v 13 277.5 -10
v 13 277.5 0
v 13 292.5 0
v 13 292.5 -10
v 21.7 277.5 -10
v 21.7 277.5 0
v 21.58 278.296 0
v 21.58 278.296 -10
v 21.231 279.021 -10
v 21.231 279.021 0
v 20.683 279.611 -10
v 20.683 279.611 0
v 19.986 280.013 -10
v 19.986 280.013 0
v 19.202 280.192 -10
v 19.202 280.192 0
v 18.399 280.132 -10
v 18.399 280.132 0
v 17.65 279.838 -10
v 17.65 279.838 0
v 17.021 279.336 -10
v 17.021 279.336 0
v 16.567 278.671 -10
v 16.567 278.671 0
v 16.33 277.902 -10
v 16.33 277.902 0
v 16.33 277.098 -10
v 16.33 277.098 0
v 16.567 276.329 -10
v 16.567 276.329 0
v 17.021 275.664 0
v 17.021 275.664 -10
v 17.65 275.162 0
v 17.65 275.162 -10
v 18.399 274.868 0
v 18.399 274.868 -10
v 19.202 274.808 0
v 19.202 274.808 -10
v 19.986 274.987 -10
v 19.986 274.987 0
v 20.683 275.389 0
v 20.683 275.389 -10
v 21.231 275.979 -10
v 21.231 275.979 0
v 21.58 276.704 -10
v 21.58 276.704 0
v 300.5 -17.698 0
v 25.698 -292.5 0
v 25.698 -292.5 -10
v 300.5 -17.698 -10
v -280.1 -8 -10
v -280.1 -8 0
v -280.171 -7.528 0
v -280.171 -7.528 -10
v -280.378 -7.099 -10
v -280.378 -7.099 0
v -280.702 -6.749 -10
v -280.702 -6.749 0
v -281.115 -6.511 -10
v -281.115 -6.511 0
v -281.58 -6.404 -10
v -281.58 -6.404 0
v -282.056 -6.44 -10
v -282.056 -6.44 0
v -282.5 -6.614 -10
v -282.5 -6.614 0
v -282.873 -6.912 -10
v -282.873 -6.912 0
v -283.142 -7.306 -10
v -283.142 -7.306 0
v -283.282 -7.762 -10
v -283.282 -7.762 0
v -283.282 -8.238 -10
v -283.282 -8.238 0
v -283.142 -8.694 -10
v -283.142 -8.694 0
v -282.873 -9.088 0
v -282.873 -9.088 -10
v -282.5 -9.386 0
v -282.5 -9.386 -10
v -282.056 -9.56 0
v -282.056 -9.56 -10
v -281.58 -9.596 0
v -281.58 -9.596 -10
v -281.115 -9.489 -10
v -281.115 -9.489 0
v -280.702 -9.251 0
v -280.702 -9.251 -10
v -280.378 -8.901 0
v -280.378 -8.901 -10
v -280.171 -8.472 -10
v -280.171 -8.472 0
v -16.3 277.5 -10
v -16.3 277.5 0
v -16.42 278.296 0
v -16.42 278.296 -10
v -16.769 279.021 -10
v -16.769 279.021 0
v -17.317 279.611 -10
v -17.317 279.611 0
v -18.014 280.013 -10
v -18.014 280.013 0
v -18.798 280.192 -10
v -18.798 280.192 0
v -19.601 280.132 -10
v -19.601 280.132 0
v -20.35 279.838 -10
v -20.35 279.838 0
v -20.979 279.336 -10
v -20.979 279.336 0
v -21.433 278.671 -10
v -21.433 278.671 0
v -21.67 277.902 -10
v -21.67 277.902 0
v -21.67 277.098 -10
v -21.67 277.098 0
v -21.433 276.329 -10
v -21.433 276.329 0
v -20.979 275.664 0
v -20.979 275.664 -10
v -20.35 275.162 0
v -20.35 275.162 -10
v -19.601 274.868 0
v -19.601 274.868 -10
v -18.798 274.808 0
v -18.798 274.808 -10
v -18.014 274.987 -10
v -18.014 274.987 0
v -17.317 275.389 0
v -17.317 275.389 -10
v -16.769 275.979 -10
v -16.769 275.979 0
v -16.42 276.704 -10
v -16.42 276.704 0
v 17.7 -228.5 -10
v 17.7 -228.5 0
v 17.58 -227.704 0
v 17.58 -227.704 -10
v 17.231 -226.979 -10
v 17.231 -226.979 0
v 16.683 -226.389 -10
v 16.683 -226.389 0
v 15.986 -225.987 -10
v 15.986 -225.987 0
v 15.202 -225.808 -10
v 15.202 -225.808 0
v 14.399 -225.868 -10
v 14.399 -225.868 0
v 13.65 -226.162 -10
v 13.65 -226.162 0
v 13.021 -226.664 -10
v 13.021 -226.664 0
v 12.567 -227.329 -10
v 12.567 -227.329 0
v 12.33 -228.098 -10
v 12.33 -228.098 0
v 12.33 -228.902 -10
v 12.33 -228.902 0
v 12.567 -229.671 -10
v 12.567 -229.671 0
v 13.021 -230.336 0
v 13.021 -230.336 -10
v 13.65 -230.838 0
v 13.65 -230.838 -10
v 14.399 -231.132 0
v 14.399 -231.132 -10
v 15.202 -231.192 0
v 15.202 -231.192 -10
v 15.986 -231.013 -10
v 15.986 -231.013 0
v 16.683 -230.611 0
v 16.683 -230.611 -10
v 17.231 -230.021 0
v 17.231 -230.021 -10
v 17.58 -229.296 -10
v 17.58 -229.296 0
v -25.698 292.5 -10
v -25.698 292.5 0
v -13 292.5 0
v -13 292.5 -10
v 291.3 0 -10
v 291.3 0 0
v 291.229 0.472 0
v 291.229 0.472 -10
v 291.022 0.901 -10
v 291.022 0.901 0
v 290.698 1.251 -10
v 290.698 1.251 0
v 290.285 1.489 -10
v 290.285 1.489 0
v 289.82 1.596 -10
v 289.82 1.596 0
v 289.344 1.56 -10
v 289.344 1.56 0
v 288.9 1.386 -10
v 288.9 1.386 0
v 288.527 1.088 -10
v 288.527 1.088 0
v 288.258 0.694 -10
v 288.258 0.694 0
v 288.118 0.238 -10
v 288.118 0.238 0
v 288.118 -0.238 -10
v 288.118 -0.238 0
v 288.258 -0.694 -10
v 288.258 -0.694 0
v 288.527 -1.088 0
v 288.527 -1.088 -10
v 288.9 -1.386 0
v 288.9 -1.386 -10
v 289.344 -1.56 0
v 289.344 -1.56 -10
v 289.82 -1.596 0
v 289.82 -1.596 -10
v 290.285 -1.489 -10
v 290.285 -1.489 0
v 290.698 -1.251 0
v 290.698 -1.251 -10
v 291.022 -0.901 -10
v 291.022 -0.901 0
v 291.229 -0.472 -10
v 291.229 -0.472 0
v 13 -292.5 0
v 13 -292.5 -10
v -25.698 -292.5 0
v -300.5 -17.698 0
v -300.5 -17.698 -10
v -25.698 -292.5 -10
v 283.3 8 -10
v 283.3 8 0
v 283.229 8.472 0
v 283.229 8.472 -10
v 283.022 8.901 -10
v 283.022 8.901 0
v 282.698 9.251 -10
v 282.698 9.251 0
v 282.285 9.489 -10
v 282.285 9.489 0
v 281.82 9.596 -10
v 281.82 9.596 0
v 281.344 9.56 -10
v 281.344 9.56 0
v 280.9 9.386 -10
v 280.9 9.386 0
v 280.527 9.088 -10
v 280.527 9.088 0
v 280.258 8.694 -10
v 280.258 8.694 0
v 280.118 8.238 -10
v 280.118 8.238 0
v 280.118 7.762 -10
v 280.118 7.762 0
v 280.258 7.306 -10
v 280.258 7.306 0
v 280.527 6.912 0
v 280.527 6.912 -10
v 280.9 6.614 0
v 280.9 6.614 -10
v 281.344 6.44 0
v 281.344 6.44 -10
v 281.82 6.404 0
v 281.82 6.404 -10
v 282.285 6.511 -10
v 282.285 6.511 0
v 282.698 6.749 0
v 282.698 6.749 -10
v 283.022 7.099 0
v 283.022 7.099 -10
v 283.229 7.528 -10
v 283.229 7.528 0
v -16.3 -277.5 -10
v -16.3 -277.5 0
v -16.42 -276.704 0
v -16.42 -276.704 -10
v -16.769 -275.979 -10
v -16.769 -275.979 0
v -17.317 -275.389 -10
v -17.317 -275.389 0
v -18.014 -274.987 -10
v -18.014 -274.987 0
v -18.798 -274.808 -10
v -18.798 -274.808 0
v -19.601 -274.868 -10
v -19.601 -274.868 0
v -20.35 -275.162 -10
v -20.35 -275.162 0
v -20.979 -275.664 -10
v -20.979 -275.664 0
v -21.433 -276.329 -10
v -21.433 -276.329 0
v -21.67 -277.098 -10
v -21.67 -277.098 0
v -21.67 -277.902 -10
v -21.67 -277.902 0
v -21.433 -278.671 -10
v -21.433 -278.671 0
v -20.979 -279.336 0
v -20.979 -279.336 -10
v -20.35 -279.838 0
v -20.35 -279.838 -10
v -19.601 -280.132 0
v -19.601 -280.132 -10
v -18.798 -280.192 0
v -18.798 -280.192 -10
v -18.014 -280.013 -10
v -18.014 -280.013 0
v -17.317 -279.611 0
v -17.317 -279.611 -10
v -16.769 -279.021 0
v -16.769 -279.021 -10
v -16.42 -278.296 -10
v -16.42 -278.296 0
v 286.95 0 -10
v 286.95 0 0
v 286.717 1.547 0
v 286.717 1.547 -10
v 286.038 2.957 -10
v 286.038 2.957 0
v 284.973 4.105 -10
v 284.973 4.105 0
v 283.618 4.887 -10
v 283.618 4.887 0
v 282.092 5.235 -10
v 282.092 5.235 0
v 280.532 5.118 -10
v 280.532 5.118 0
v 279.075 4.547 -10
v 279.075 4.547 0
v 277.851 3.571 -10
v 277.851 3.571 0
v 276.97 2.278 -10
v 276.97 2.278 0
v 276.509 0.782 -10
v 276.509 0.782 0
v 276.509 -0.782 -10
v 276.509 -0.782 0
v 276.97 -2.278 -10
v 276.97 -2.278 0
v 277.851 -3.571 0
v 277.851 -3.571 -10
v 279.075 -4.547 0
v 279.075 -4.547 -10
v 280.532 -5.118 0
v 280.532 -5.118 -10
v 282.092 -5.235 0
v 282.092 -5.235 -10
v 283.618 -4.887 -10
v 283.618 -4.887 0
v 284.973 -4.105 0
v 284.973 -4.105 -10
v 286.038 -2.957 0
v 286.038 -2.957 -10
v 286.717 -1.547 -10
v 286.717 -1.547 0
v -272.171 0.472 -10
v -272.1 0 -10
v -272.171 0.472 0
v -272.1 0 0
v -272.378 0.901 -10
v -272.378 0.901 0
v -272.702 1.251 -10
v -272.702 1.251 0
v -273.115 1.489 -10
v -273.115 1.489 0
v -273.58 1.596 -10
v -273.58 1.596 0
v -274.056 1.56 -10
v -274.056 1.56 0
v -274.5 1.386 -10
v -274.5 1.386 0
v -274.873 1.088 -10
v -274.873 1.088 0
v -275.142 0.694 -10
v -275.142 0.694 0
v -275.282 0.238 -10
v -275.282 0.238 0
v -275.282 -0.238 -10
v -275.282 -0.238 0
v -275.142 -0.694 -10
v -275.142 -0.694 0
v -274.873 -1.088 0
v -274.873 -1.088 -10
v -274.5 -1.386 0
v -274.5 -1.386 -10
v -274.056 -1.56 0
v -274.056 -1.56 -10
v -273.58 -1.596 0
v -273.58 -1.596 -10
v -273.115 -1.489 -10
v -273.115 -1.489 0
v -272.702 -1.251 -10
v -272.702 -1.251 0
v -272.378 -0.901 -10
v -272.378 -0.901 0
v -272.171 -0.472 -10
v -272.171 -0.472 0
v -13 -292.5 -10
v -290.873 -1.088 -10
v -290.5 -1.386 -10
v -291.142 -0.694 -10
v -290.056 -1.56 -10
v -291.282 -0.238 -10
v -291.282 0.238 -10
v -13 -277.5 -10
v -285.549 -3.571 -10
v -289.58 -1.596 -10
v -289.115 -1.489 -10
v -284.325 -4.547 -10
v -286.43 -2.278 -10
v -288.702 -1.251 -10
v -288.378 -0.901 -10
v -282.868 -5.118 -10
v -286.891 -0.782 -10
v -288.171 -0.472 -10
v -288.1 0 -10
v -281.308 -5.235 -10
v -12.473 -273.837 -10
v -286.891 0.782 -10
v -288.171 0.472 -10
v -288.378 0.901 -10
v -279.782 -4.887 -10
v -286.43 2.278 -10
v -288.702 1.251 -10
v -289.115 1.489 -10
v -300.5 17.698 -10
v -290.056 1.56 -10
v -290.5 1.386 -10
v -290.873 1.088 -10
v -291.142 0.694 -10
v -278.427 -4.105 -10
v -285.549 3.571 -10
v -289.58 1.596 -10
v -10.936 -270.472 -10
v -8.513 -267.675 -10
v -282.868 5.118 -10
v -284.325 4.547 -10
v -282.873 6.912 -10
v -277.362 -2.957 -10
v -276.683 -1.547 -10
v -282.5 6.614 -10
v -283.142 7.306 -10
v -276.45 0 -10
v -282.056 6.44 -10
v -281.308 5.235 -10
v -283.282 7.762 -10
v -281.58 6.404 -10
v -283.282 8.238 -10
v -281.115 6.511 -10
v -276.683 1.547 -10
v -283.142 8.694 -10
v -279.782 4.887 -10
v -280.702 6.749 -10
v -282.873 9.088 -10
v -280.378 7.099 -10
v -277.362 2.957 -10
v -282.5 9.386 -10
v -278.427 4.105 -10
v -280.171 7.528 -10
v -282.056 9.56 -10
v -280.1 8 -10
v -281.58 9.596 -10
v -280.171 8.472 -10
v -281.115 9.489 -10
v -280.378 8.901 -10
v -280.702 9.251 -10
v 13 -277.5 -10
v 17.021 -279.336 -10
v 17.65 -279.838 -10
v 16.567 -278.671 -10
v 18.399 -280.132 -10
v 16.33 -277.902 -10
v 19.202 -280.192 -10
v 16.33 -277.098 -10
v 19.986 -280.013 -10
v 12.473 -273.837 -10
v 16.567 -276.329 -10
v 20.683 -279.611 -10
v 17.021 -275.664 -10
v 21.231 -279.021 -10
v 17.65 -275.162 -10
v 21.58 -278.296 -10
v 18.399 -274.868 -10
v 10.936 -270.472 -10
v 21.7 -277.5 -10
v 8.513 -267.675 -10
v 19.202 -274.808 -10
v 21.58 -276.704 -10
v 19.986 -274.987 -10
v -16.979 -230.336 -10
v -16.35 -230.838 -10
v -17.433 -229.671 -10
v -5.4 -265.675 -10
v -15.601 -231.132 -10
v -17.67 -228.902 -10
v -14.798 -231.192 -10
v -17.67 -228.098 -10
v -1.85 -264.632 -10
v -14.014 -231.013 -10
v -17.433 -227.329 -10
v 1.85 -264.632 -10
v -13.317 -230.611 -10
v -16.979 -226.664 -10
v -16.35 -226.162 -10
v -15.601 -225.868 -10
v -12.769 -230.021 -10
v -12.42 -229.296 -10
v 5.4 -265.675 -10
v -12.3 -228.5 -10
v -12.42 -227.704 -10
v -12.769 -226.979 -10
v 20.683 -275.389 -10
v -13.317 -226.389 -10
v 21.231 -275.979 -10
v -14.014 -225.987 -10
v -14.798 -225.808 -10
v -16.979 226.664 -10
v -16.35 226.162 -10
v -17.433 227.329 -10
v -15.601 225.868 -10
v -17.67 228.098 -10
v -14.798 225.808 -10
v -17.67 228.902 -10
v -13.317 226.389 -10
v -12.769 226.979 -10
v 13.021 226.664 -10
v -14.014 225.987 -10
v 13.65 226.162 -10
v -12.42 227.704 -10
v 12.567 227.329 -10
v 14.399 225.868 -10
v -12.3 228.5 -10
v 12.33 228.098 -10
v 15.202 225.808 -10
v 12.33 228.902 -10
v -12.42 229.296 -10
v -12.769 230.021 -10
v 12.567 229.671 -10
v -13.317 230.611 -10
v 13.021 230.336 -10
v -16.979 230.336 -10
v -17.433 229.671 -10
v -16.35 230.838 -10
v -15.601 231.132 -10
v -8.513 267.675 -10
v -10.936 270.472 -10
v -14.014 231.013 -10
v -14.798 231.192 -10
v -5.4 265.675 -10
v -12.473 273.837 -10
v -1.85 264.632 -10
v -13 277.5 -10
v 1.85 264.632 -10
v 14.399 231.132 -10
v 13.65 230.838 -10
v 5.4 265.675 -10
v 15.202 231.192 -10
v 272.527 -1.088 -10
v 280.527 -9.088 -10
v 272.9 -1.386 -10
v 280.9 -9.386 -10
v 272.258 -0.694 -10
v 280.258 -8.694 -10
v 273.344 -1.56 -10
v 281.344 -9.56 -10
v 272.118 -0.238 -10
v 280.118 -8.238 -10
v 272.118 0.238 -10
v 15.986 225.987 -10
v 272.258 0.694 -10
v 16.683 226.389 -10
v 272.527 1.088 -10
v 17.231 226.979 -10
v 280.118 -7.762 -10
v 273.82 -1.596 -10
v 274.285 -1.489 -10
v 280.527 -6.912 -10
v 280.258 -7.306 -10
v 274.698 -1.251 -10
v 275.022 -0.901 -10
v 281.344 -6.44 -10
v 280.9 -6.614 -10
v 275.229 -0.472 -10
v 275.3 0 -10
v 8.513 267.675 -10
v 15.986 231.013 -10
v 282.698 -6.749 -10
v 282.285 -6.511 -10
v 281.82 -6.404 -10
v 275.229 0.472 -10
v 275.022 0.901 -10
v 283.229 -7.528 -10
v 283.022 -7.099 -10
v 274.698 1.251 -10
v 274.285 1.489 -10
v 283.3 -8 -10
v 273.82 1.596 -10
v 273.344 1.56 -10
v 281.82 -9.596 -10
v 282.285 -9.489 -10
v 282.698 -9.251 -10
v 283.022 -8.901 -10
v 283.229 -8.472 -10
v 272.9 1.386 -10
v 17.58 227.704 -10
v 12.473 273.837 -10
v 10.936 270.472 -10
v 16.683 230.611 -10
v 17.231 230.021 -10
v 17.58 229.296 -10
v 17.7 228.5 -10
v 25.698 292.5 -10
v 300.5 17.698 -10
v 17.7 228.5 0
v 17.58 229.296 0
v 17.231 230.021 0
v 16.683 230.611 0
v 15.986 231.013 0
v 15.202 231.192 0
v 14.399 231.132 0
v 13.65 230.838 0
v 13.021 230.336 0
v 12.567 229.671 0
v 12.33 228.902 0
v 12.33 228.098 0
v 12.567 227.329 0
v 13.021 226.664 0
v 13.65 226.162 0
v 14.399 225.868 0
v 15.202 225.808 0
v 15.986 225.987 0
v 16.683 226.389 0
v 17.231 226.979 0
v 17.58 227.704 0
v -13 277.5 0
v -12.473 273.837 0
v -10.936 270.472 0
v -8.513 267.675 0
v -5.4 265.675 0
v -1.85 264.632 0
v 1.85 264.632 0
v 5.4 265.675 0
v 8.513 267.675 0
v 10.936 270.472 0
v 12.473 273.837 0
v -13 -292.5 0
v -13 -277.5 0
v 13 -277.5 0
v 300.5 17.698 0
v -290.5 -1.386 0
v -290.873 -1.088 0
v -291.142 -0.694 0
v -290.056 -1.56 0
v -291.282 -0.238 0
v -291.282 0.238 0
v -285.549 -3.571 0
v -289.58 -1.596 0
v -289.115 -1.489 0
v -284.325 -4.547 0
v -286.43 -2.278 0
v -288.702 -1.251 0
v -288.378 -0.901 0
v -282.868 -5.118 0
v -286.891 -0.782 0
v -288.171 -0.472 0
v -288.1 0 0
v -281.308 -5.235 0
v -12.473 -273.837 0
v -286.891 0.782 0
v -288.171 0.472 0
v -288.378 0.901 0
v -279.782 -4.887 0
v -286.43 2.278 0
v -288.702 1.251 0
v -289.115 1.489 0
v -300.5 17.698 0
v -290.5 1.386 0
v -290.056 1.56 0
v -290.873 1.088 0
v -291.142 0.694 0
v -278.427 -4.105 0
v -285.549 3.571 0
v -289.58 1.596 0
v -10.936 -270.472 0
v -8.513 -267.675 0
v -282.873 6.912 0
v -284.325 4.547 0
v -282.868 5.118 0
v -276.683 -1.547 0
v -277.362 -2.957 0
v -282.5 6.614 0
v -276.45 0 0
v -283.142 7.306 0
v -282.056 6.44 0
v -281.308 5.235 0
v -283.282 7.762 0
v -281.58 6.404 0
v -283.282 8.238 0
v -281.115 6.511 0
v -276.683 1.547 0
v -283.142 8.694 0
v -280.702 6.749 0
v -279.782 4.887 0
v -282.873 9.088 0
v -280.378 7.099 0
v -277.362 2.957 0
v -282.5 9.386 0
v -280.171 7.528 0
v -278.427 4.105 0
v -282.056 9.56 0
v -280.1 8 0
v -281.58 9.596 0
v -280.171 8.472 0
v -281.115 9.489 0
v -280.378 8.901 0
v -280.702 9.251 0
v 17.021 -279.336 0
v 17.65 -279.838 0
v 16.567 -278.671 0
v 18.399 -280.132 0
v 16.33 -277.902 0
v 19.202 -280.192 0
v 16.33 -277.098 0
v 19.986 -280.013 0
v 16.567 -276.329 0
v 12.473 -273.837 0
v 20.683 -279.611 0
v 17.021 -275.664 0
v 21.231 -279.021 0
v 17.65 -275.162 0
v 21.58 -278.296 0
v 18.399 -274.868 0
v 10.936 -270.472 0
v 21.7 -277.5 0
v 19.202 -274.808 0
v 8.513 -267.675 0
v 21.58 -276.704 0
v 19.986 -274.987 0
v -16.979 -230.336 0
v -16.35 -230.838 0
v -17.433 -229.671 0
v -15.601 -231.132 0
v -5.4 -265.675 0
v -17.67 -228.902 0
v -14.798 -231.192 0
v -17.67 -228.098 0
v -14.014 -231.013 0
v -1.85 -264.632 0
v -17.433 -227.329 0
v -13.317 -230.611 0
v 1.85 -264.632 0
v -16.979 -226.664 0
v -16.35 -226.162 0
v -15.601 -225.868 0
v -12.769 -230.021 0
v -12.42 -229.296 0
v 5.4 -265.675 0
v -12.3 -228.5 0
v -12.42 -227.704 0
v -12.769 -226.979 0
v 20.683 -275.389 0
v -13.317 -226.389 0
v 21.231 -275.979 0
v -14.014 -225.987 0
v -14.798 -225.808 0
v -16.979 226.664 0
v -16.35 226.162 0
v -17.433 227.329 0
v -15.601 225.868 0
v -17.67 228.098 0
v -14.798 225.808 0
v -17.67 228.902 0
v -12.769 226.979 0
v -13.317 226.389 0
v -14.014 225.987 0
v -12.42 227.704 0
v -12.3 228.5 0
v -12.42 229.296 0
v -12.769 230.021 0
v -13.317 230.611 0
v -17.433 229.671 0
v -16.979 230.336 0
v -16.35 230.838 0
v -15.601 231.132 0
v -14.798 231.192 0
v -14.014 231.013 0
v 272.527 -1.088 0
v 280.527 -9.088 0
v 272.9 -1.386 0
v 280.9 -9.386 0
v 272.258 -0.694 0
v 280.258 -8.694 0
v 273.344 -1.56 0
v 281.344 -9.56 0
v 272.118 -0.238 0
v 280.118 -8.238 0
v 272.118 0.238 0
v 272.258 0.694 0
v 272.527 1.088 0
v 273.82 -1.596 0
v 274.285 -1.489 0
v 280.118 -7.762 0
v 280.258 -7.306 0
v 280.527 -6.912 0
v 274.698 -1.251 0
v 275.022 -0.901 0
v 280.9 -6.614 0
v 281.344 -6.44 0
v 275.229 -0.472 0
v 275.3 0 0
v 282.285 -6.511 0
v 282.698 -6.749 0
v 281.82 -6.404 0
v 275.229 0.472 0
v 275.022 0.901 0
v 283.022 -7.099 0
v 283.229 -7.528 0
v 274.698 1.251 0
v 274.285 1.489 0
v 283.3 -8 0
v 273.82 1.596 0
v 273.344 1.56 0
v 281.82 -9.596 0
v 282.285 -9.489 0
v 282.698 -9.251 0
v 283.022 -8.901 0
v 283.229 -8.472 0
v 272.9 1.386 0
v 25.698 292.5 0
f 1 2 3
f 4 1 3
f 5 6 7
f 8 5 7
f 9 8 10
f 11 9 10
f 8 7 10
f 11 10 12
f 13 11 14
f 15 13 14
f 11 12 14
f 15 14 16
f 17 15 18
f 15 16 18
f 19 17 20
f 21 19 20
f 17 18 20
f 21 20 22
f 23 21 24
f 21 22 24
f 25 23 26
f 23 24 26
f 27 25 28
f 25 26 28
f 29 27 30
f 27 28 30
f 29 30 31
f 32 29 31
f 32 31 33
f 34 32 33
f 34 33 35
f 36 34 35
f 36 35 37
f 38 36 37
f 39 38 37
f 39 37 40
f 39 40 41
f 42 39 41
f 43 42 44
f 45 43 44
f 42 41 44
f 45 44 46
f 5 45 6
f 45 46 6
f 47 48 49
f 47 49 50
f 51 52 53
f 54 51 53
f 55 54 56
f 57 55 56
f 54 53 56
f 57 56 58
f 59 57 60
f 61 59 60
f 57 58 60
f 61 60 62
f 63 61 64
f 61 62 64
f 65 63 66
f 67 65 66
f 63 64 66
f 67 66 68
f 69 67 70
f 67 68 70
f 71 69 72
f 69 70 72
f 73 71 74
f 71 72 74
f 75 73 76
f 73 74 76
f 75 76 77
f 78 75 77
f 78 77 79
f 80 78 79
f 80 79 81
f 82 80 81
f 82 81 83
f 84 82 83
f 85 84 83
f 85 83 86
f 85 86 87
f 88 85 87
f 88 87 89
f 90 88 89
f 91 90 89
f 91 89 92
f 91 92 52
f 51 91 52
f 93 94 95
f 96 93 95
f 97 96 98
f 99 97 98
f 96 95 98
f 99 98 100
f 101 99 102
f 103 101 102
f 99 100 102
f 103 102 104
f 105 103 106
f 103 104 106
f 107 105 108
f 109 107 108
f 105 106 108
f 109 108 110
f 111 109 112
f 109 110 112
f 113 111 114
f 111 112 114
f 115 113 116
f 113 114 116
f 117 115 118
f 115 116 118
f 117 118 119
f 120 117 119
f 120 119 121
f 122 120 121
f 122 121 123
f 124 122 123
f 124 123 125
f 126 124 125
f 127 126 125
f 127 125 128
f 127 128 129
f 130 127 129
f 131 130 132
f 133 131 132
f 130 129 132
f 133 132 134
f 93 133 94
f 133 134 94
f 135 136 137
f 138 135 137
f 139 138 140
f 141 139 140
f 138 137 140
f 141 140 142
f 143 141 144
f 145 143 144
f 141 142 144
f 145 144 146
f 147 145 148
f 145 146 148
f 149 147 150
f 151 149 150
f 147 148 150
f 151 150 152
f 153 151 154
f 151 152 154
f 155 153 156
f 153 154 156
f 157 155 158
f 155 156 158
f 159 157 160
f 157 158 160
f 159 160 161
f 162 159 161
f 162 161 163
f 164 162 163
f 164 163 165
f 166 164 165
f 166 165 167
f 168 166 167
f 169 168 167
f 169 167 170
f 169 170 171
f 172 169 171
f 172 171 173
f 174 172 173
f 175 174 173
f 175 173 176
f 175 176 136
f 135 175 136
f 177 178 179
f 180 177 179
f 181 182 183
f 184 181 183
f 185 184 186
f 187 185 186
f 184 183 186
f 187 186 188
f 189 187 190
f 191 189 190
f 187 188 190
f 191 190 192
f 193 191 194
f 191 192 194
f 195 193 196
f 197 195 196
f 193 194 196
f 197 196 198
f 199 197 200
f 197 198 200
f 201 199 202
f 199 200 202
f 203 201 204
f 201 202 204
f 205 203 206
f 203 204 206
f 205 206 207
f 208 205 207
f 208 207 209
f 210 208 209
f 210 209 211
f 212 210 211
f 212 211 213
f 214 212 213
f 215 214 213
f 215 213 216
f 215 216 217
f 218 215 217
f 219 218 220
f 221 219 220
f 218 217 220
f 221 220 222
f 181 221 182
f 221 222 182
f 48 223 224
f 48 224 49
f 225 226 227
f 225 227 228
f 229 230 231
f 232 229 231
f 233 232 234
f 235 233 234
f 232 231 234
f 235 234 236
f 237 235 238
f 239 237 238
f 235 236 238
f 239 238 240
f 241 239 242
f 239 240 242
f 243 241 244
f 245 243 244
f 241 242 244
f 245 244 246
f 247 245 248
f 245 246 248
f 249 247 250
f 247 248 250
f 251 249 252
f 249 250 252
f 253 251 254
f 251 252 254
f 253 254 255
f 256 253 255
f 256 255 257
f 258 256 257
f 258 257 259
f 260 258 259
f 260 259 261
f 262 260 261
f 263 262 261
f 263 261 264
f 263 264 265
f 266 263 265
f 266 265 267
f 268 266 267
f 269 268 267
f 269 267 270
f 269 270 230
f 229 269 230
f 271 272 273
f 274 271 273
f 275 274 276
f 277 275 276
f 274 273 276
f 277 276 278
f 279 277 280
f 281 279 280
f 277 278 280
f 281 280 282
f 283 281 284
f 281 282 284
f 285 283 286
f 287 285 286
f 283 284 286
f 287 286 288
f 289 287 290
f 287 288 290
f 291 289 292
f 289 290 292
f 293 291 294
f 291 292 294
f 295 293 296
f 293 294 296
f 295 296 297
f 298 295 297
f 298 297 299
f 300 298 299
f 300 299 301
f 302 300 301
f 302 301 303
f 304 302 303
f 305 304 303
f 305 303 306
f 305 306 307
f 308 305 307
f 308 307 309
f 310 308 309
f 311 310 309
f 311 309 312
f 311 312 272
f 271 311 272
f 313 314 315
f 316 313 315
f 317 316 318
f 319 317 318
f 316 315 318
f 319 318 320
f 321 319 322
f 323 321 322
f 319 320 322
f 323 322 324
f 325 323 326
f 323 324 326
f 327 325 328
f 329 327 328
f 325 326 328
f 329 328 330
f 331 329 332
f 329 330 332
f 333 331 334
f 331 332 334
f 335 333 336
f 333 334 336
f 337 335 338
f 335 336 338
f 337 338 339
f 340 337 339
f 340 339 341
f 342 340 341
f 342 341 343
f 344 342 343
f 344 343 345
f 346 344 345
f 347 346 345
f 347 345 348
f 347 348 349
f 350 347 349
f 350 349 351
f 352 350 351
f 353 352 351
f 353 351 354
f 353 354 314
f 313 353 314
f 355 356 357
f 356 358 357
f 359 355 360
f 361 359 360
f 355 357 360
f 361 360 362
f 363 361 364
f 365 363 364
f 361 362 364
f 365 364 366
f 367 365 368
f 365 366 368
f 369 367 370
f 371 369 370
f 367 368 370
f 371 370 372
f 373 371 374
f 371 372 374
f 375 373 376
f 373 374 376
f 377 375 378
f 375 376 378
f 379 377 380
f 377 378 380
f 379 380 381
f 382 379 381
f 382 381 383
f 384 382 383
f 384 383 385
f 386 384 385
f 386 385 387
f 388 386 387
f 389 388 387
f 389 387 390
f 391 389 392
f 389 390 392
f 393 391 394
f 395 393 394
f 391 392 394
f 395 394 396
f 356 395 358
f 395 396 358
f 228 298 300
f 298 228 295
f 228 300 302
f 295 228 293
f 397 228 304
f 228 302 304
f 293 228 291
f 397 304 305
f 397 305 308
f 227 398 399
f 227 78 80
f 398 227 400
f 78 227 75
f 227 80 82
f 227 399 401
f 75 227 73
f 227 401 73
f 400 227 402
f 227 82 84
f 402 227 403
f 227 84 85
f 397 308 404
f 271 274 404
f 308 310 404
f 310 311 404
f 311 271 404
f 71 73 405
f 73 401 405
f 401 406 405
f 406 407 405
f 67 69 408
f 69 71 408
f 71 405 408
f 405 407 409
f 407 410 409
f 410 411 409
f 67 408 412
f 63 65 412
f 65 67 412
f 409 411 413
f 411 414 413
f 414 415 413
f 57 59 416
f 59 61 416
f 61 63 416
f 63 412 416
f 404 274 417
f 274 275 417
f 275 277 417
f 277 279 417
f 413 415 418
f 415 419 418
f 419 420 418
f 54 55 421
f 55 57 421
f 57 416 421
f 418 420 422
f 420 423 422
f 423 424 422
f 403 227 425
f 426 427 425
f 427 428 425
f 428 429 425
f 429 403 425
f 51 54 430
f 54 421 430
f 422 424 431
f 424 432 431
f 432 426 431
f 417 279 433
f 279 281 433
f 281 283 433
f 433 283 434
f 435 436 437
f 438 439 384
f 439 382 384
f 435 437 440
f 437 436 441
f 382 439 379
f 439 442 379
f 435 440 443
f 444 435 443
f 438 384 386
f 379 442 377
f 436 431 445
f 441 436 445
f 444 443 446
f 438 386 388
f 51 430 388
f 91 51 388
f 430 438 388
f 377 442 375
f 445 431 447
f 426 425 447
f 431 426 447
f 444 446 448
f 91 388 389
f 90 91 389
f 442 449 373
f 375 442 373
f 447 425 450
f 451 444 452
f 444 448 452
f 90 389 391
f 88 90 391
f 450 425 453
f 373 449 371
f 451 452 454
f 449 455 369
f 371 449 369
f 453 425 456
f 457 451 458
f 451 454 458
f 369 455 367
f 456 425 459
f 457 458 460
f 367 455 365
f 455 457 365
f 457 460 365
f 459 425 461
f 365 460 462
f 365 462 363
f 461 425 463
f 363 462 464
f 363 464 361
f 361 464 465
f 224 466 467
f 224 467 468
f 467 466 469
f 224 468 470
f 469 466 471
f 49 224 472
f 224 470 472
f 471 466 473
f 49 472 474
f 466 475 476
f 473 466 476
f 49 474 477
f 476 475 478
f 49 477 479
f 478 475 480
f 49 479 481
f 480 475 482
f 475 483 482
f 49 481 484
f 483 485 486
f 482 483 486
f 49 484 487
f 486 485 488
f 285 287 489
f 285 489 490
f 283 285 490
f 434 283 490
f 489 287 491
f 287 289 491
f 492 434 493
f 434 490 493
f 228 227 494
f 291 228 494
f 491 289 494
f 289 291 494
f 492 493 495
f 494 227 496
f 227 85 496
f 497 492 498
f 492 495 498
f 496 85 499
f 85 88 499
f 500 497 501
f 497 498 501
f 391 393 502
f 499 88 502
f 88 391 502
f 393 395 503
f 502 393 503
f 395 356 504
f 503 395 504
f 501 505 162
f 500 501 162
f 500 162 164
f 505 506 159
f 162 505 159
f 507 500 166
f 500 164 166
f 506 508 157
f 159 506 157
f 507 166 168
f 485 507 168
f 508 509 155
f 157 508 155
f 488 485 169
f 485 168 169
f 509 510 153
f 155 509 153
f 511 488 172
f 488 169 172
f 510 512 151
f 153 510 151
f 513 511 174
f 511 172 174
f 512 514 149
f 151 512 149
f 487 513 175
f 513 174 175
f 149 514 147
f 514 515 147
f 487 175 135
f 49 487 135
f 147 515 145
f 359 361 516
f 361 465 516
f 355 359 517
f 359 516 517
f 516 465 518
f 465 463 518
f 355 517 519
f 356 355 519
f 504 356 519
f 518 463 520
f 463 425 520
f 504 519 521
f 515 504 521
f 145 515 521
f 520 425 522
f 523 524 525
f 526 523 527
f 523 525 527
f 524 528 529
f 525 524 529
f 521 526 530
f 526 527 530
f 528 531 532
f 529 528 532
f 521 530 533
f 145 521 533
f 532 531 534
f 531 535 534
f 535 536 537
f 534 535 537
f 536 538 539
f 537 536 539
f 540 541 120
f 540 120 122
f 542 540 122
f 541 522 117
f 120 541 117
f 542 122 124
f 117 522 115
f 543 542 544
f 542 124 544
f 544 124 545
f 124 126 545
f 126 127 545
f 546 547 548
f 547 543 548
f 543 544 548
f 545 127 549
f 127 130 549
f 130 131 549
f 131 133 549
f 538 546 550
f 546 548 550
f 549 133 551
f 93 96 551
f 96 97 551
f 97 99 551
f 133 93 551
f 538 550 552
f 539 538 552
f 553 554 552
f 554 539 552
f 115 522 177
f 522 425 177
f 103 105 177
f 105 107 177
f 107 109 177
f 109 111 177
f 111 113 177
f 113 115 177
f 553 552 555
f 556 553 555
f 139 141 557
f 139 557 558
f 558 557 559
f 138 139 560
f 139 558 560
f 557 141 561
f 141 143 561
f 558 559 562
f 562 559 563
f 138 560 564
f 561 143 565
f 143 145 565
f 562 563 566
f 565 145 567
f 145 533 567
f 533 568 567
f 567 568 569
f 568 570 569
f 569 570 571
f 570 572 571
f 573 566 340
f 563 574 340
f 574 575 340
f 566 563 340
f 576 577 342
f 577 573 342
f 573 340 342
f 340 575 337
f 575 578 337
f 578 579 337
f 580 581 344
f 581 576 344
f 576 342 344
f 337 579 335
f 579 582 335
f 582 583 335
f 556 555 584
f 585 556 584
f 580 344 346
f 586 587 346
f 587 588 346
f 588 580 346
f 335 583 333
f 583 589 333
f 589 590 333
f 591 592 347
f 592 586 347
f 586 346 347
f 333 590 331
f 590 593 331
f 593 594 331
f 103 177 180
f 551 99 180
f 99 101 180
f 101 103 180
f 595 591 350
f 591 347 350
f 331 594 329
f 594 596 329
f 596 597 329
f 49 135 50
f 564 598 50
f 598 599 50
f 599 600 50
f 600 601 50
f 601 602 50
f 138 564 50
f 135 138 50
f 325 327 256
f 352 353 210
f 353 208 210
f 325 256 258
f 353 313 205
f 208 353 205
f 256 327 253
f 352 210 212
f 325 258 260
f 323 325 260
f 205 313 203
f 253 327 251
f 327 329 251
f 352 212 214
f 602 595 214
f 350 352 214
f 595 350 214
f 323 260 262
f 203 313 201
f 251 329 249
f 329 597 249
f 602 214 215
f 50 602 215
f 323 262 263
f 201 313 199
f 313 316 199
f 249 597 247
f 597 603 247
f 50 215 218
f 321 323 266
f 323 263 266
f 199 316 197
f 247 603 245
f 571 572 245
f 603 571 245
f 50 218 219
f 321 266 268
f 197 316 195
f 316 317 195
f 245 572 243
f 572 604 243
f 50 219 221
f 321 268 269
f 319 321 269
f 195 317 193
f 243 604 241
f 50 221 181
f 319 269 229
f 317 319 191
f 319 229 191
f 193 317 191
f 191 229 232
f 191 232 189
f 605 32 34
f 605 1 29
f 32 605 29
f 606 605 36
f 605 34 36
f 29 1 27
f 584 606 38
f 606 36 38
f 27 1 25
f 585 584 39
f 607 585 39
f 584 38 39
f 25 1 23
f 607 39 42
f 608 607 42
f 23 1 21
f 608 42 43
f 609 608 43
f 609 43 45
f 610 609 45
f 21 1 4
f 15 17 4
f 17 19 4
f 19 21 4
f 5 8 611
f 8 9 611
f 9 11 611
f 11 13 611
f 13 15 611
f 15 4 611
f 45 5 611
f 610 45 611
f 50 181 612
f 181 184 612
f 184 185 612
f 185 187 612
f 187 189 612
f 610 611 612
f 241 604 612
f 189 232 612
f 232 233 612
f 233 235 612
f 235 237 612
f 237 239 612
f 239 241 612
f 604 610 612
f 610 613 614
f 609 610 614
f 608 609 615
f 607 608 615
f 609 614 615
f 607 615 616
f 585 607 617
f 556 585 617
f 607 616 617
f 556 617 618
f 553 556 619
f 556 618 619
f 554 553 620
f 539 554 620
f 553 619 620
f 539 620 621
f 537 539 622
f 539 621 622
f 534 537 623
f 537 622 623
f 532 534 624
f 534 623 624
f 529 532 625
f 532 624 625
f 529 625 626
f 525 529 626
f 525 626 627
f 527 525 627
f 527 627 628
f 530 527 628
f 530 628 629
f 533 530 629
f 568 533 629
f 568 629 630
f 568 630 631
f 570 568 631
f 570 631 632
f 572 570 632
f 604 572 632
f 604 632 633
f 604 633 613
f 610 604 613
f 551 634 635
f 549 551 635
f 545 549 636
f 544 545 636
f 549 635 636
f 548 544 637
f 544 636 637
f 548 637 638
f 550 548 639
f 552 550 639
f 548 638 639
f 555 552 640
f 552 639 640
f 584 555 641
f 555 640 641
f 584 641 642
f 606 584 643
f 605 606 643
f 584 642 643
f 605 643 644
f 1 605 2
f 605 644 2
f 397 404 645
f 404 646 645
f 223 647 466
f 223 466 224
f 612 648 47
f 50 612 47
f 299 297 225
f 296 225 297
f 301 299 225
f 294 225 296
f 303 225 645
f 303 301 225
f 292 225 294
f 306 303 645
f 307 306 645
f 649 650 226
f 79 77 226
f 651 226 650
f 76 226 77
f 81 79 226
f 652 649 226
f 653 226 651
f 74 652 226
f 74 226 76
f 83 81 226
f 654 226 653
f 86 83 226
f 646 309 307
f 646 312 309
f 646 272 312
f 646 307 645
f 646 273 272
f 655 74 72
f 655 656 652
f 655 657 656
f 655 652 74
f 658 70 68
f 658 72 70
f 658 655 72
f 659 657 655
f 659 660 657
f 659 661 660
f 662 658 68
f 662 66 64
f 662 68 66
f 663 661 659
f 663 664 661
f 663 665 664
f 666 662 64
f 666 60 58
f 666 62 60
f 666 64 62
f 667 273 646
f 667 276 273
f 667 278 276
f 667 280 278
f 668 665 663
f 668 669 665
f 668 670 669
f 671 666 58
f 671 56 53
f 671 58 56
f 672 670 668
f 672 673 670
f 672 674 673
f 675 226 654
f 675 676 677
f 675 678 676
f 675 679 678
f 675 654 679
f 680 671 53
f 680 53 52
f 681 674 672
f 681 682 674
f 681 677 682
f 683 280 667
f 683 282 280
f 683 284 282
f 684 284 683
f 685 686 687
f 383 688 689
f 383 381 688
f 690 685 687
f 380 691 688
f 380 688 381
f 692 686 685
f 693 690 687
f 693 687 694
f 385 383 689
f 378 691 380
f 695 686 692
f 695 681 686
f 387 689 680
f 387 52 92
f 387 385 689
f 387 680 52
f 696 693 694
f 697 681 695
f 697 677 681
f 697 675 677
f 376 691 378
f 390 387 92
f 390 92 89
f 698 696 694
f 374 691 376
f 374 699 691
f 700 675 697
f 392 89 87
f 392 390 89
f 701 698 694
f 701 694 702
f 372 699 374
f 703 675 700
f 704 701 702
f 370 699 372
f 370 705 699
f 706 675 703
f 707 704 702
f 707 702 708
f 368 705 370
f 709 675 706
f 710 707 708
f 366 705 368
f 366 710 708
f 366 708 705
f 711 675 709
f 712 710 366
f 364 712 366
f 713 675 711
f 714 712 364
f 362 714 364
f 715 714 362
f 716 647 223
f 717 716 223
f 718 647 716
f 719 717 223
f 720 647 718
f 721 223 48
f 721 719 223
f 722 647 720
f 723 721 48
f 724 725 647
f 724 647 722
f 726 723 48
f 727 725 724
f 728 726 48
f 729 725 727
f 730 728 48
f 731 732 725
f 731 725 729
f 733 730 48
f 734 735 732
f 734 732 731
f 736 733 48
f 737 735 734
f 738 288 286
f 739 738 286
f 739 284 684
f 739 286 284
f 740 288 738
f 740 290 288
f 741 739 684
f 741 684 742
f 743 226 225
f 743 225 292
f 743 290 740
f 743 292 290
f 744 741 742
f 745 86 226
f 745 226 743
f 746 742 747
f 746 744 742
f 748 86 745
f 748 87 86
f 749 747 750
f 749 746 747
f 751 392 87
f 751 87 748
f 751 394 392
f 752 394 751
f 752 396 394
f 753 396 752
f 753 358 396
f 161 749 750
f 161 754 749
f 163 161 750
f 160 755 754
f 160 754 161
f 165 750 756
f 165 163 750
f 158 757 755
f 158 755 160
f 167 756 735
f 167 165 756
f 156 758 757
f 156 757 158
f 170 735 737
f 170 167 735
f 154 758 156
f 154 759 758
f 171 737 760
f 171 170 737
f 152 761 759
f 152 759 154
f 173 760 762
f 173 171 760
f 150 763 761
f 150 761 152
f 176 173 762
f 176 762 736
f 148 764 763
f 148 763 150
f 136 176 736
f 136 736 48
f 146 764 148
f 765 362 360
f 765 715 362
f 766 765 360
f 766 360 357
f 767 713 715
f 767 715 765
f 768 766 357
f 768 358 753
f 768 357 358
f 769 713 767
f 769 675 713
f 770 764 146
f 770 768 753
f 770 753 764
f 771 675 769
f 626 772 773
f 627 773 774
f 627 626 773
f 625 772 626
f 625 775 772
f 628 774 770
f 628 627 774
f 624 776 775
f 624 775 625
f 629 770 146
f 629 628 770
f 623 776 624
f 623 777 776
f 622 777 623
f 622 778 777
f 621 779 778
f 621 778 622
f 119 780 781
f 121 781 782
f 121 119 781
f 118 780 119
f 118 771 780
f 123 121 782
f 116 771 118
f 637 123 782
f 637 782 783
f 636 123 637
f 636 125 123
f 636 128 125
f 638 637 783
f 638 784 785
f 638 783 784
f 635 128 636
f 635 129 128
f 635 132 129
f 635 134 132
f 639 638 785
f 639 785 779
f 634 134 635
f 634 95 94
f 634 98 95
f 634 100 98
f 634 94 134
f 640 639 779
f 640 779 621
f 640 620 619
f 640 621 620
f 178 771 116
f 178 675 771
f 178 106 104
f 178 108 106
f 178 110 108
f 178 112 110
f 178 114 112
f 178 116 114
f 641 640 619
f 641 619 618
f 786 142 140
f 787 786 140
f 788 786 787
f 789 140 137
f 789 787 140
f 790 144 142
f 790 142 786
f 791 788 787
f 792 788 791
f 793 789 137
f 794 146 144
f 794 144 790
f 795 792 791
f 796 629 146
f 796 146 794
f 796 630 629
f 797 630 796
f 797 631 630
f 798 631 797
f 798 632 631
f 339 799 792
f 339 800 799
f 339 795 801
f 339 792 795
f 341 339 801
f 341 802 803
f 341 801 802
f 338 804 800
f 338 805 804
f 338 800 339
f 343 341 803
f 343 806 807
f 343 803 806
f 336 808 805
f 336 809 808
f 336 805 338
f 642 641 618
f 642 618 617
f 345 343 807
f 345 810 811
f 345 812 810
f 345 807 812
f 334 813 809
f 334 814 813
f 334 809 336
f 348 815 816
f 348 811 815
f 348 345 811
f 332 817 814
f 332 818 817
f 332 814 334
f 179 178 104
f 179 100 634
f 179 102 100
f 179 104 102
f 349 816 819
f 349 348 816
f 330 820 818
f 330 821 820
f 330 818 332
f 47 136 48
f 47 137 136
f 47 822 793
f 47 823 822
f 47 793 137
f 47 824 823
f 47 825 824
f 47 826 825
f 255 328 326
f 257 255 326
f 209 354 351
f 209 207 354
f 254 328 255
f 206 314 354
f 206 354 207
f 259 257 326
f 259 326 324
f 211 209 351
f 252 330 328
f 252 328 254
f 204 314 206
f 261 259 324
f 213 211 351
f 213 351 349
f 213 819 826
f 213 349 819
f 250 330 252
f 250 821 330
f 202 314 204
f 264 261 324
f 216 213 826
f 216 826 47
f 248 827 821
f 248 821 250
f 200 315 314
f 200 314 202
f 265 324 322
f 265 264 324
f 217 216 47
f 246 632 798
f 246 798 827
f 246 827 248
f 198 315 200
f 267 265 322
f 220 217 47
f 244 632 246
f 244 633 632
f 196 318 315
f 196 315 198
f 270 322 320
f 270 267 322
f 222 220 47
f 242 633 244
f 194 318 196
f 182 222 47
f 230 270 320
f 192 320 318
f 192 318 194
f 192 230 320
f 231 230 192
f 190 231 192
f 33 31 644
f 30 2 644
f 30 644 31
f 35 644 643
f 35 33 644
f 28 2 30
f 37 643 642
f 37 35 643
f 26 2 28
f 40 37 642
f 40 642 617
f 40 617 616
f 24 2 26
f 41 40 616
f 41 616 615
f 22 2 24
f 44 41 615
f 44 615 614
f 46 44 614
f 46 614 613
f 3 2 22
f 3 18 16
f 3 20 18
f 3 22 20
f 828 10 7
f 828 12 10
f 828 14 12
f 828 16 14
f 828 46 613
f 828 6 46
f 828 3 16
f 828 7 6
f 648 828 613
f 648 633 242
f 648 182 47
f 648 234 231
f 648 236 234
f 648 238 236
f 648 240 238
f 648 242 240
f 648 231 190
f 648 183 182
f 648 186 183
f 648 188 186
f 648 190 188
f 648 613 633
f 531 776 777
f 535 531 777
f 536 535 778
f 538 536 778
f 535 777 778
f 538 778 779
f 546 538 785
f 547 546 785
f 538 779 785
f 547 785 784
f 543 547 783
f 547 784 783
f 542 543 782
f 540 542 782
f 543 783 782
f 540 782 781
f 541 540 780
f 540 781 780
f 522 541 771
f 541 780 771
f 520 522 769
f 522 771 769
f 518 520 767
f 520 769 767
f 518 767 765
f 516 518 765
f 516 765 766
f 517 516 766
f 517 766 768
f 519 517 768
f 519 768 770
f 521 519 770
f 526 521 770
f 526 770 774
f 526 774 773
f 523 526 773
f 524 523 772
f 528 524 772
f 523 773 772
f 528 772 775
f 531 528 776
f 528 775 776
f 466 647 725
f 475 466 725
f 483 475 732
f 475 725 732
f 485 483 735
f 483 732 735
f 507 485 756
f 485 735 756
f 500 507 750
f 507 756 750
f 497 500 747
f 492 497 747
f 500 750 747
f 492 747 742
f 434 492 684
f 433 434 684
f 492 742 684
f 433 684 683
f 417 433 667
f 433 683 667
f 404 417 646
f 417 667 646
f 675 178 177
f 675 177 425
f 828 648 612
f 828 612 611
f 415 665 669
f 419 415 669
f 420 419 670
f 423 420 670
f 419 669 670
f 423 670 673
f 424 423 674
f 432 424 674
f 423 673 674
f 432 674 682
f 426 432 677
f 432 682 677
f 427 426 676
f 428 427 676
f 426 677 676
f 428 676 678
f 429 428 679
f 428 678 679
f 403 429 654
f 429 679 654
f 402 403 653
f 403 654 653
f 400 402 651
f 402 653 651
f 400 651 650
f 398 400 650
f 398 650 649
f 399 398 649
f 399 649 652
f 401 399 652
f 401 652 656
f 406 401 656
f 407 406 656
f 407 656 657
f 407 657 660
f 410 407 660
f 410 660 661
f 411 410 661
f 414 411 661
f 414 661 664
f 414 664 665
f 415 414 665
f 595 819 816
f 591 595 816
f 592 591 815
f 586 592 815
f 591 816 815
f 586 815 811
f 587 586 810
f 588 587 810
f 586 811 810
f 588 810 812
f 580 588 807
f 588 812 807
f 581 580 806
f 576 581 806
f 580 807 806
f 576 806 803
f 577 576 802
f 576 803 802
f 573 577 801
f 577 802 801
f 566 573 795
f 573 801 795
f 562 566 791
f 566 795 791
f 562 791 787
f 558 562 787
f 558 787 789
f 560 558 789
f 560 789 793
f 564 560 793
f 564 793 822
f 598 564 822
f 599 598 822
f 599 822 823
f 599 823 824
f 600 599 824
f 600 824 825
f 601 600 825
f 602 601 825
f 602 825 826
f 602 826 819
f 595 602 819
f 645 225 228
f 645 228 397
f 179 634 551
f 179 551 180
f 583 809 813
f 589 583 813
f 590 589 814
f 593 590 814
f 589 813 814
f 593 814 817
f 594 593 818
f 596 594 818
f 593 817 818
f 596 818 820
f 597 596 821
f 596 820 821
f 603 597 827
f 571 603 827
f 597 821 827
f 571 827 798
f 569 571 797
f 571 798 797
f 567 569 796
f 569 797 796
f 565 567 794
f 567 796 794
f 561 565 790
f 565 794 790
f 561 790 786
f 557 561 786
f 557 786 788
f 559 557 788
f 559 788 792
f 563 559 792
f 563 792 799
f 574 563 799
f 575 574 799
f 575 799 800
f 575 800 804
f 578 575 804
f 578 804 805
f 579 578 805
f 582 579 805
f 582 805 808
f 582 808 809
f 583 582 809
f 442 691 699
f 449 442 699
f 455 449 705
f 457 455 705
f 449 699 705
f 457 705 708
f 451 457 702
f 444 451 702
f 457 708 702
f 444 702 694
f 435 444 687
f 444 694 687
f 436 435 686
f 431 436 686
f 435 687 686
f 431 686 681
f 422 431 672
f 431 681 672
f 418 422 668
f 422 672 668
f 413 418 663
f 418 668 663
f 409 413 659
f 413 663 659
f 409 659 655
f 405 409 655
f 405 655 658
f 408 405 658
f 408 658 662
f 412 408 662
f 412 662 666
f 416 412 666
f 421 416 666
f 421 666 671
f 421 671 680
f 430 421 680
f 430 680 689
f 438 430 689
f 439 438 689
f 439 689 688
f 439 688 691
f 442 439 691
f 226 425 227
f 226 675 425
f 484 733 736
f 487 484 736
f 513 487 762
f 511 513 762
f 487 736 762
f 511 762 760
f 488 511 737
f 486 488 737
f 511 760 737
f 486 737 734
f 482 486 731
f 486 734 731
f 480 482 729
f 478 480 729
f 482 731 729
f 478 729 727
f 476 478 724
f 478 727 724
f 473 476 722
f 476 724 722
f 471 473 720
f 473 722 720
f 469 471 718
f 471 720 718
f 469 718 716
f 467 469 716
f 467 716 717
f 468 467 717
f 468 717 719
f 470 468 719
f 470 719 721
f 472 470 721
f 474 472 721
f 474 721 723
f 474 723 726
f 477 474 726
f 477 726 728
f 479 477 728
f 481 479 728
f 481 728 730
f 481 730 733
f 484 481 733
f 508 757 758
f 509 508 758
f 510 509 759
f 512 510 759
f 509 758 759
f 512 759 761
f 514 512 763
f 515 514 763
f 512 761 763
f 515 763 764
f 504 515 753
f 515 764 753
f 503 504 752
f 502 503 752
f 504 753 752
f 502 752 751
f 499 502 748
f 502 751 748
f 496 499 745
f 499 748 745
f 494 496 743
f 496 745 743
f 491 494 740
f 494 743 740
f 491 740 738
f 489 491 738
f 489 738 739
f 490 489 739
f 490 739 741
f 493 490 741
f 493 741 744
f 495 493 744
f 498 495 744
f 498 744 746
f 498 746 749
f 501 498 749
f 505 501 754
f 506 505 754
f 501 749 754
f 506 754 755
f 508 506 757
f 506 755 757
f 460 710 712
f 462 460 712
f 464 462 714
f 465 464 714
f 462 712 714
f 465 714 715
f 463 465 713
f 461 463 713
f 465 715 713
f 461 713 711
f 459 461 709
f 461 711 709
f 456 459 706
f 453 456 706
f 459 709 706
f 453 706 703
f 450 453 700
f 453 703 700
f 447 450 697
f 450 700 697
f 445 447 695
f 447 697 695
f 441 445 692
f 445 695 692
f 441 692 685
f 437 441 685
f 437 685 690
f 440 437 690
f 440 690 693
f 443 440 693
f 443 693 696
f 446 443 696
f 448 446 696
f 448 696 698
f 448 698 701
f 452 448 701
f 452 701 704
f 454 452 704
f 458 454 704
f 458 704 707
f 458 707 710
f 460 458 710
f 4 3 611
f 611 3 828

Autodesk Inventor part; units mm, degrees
ref_plane "YZ Plane" through (0, 0, 0) normal (1, 0, 0) x (0, 1, 0)
ref_plane "XZ Plane" through (0, 0, 0) normal (0, 1, 0) x (-1, 0, 0)
ref_plane "XY Plane" through (0, 0, 0) normal (0, 0, 1) x (1, 0, 0)
sketch "Sketch2" plane through (0, 0, 0) normal (0, 0, 1) x (1, 0, 0)
  circle A0 centre (0, 277.5) radius 8 construction
  circle A1 centre (0, 277.5) radius 13
  circle A2 centre (0, 277.5) radius 10.5 construction
  line L0 (25, 287.5) -> (-25, 287.5) construction
  line L1 (-25, 287.5) -> (-25, 222.5) construction
  line L2 (-25, 222.5) -> (25, 222.5) construction
  line L3 (25, 222.5) -> (25, 287.5) construction
  circle A3 centre (15, 228.5) radius 2.7
  circle A4 centre (-15, 228.5) radius 2.7
  circle A5 centre (-19, 277.5) radius 2.7
  circle A6 centre (19, 277.5) radius 2.7
  circle A7 centre (0, -277.5) radius 8 construction
  circle A8 centre (0, -277.5) radius 13
  circle A9 centre (0, -277.5) radius 10.5 construction
  line L4 (25, -287.5) -> (-25, -287.5) construction
  line L5 (-25, -287.5) -> (-25, -222.5) construction
  line L6 (-25, -222.5) -> (25, -222.5) construction
  line L7 (25, -222.5) -> (25, -287.5) construction
  circle A10 centre (-15, -228.5) radius 2.7
  circle A11 centre (15, -228.5) radius 2.7
  circle A12 centre (-19, -277.5) radius 2.7
  circle A13 centre (19, -277.5) radius 2.7
  line L8 (10.5, -277.5) -> (10.5, -287.5) construction
  line L9 (-10.5, -277.5) -> (-10.5, -287.5) construction
  line L10 (10.5, 277.5) -> (10.5, 287.5) construction
  line L11 (-10.5, 277.5) -> (-10.5, 287.5) construction
  circle A14 centre (281.7, 0) radius 5.25
  circle A15 centre (289.7, 0) radius 1.6
  circle A16 centre (281.7, 8) radius 1.6
  circle A17 centre (273.7, 0) radius 1.6
  circle A18 centre (281.7, -8) radius 1.6
  circle A19 centre (-281.7, 0) radius 5.25
  circle A20 centre (-289.7, 0) radius 1.6
  circle A21 centre (-281.7, -8) radius 1.6
  circle A22 centre (-273.7, 0) radius 1.6
  circle A23 centre (-281.7, 8) radius 1.6
  line L12 (0, -318.1981) -> (318.1981, 0)
  line L13 (318.1981, 0) -> (0, 318.1981)
  line L14 (0, 318.1981) -> (-318.1981, 0)
  line L15 (-318.1981, 0) -> (0, -318.1981)
  line L16 (0, -318.1981) -> (0, 318.1981) construction
  line L17 (318.1981, 0) -> (-318.1981, 0) construction
  line L18 (0, -318.1981) -> (450, -318.1981) construction
  line L19 (300.5, 17.6981) -> (300.5, -17.6981)
  line L20 (-300.5, 17.6981) -> (-300.5, -17.6981)
  line L21 (-20.6981, 297.5) -> (20.6981, 297.5) construction
  line L22 (-25.6981, 292.5) -> (25.6981, 292.5)
  line L23 (-20.6981, -297.5) -> (20.6981, -297.5) construction
  line L24 (-25.6981, -292.5) -> (25.6981, -292.5)
  line L25 (-9.5, 297.5) -> (-3.976, 284.442) construction
  line L26 (9.5, 297.5) -> (3.976, 284.442) construction
  line L27 (-14.929, 297.5) -> (-9.9883, 285.8207)
  line L28 (14.929, 297.5) -> (9.9883, 285.8207)
  line L29 (-9.5, -297.5) -> (-3.976, -284.442) construction
  line L30 (9.5, -297.5) -> (3.976, -284.442) construction
  line L31 (14.929, -297.5) -> (9.9883, -285.8207)
  line L32 (-14.929, -297.5) -> (-9.9883, -285.8207)
  line L33 (-13, 277.5) -> (-13, 292.5)
  line L34 (13, 277.5) -> (13, 292.5)
  line L35 (-13, -277.5) -> (-13, -292.5)
  line L36 (13, -277.5) -> (13, -292.5)
  line L37 (13, -277.5) -> (28, -277.5) construction
  point P0 (0, 0)
  point P1 (-12.8138, -292.5)
  point P2 (12.8138, -292.5)
  point P3 (12.8138, 292.5)
  point P4 (-12.8138, 292.5)
  point P5 (300.5, 292.5)
  point P6 (300.5, -292.5)
  point P7 (-300.5, -292.5)
  point P8 (-300.5, 292.5)
  dimension "d256" = 16
  dimension "d257" = 0
  dimension "d258" = 277.5
  dimension "d259" = 26
  dimension "d260" = 21
  dimension "d261" = 50
  dimension "d262" = 10
  dimension "d263" = 65
  dimension "d265" = 50
  dimension "d266" = 25
  dimension "d267" = 5.4
  dimension "d268" = 5.4
  dimension "d269" = 5.4
  dimension "d270" = 5.4
  dimension "d271" = 6
  dimension "d272" = 10
  dimension "d273" = 6
  dimension "d274" = 10
  dimension "d275" = 6
  dimension "d276" = 10
  dimension "d277" = 6
  dimension "d278" = 10
  dimension "d279" = 0
  dimension "d280" = 277.5
  dimension "d281" = 26
  dimension "d282" = 16
  dimension "d283" = 21
  dimension "d284" = 50
  dimension "d285" = 10
  dimension "d286" = 65
  dimension "d287" = 25
  dimension "d288" = 5.4
  dimension "d289" = 5.4
  dimension "d290" = 5.4
  dimension "d291" = 5.4
  dimension "d292" = 6
  dimension "d293" = 10
  dimension "d294" = 6
  dimension "d295" = 10
  dimension "d296" = 10
  dimension "d297" = 6
  dimension "d298" = 10
  dimension "d299" = 6
  dimension "d300" = 10.5
  dimension "d301" = 0
  dimension "d302" = 281.7
  dimension "d303" = 3.2
  dimension "d304" = 0
  dimension "d305" = 8
  dimension "d308" = 360
  dimension "d310" = 10.5
  dimension "d311" = 0
  dimension "d312" = 281.7
  dimension "d313" = 3.2
  dimension "d314" = 0
  dimension "d315" = 8
  dimension "d318" = 360
  dimension "d320" = 450
  dimension "d321" = 45
  dimension "d322" = 450
  dimension "d323" = 18.8
  dimension "d324" = 18.8
  dimension "d325" = 20
  dimension "d326" = 15
extrude "Extrusion11" add sketch "Sketch2" against normal blind 10 contours L34 L22 L13 L19 L12 L24 L36 A8 L35 L15 L20 L14 L33 A1
equation "\"dist_rails\" = 555"
equation "\"dist_leadscrews\" = 563.4"
equation "\"diam_leadscrew_hole\" = 10.5"
equation "\"delta\" = 5"
equation "\"rail_angle\" = 67.07deg"
equation "\"rail_D\" = 9.5"
equation "\"rail_diam\" = 16"
properties part number "z_plate" material "Aluminum 6061"
